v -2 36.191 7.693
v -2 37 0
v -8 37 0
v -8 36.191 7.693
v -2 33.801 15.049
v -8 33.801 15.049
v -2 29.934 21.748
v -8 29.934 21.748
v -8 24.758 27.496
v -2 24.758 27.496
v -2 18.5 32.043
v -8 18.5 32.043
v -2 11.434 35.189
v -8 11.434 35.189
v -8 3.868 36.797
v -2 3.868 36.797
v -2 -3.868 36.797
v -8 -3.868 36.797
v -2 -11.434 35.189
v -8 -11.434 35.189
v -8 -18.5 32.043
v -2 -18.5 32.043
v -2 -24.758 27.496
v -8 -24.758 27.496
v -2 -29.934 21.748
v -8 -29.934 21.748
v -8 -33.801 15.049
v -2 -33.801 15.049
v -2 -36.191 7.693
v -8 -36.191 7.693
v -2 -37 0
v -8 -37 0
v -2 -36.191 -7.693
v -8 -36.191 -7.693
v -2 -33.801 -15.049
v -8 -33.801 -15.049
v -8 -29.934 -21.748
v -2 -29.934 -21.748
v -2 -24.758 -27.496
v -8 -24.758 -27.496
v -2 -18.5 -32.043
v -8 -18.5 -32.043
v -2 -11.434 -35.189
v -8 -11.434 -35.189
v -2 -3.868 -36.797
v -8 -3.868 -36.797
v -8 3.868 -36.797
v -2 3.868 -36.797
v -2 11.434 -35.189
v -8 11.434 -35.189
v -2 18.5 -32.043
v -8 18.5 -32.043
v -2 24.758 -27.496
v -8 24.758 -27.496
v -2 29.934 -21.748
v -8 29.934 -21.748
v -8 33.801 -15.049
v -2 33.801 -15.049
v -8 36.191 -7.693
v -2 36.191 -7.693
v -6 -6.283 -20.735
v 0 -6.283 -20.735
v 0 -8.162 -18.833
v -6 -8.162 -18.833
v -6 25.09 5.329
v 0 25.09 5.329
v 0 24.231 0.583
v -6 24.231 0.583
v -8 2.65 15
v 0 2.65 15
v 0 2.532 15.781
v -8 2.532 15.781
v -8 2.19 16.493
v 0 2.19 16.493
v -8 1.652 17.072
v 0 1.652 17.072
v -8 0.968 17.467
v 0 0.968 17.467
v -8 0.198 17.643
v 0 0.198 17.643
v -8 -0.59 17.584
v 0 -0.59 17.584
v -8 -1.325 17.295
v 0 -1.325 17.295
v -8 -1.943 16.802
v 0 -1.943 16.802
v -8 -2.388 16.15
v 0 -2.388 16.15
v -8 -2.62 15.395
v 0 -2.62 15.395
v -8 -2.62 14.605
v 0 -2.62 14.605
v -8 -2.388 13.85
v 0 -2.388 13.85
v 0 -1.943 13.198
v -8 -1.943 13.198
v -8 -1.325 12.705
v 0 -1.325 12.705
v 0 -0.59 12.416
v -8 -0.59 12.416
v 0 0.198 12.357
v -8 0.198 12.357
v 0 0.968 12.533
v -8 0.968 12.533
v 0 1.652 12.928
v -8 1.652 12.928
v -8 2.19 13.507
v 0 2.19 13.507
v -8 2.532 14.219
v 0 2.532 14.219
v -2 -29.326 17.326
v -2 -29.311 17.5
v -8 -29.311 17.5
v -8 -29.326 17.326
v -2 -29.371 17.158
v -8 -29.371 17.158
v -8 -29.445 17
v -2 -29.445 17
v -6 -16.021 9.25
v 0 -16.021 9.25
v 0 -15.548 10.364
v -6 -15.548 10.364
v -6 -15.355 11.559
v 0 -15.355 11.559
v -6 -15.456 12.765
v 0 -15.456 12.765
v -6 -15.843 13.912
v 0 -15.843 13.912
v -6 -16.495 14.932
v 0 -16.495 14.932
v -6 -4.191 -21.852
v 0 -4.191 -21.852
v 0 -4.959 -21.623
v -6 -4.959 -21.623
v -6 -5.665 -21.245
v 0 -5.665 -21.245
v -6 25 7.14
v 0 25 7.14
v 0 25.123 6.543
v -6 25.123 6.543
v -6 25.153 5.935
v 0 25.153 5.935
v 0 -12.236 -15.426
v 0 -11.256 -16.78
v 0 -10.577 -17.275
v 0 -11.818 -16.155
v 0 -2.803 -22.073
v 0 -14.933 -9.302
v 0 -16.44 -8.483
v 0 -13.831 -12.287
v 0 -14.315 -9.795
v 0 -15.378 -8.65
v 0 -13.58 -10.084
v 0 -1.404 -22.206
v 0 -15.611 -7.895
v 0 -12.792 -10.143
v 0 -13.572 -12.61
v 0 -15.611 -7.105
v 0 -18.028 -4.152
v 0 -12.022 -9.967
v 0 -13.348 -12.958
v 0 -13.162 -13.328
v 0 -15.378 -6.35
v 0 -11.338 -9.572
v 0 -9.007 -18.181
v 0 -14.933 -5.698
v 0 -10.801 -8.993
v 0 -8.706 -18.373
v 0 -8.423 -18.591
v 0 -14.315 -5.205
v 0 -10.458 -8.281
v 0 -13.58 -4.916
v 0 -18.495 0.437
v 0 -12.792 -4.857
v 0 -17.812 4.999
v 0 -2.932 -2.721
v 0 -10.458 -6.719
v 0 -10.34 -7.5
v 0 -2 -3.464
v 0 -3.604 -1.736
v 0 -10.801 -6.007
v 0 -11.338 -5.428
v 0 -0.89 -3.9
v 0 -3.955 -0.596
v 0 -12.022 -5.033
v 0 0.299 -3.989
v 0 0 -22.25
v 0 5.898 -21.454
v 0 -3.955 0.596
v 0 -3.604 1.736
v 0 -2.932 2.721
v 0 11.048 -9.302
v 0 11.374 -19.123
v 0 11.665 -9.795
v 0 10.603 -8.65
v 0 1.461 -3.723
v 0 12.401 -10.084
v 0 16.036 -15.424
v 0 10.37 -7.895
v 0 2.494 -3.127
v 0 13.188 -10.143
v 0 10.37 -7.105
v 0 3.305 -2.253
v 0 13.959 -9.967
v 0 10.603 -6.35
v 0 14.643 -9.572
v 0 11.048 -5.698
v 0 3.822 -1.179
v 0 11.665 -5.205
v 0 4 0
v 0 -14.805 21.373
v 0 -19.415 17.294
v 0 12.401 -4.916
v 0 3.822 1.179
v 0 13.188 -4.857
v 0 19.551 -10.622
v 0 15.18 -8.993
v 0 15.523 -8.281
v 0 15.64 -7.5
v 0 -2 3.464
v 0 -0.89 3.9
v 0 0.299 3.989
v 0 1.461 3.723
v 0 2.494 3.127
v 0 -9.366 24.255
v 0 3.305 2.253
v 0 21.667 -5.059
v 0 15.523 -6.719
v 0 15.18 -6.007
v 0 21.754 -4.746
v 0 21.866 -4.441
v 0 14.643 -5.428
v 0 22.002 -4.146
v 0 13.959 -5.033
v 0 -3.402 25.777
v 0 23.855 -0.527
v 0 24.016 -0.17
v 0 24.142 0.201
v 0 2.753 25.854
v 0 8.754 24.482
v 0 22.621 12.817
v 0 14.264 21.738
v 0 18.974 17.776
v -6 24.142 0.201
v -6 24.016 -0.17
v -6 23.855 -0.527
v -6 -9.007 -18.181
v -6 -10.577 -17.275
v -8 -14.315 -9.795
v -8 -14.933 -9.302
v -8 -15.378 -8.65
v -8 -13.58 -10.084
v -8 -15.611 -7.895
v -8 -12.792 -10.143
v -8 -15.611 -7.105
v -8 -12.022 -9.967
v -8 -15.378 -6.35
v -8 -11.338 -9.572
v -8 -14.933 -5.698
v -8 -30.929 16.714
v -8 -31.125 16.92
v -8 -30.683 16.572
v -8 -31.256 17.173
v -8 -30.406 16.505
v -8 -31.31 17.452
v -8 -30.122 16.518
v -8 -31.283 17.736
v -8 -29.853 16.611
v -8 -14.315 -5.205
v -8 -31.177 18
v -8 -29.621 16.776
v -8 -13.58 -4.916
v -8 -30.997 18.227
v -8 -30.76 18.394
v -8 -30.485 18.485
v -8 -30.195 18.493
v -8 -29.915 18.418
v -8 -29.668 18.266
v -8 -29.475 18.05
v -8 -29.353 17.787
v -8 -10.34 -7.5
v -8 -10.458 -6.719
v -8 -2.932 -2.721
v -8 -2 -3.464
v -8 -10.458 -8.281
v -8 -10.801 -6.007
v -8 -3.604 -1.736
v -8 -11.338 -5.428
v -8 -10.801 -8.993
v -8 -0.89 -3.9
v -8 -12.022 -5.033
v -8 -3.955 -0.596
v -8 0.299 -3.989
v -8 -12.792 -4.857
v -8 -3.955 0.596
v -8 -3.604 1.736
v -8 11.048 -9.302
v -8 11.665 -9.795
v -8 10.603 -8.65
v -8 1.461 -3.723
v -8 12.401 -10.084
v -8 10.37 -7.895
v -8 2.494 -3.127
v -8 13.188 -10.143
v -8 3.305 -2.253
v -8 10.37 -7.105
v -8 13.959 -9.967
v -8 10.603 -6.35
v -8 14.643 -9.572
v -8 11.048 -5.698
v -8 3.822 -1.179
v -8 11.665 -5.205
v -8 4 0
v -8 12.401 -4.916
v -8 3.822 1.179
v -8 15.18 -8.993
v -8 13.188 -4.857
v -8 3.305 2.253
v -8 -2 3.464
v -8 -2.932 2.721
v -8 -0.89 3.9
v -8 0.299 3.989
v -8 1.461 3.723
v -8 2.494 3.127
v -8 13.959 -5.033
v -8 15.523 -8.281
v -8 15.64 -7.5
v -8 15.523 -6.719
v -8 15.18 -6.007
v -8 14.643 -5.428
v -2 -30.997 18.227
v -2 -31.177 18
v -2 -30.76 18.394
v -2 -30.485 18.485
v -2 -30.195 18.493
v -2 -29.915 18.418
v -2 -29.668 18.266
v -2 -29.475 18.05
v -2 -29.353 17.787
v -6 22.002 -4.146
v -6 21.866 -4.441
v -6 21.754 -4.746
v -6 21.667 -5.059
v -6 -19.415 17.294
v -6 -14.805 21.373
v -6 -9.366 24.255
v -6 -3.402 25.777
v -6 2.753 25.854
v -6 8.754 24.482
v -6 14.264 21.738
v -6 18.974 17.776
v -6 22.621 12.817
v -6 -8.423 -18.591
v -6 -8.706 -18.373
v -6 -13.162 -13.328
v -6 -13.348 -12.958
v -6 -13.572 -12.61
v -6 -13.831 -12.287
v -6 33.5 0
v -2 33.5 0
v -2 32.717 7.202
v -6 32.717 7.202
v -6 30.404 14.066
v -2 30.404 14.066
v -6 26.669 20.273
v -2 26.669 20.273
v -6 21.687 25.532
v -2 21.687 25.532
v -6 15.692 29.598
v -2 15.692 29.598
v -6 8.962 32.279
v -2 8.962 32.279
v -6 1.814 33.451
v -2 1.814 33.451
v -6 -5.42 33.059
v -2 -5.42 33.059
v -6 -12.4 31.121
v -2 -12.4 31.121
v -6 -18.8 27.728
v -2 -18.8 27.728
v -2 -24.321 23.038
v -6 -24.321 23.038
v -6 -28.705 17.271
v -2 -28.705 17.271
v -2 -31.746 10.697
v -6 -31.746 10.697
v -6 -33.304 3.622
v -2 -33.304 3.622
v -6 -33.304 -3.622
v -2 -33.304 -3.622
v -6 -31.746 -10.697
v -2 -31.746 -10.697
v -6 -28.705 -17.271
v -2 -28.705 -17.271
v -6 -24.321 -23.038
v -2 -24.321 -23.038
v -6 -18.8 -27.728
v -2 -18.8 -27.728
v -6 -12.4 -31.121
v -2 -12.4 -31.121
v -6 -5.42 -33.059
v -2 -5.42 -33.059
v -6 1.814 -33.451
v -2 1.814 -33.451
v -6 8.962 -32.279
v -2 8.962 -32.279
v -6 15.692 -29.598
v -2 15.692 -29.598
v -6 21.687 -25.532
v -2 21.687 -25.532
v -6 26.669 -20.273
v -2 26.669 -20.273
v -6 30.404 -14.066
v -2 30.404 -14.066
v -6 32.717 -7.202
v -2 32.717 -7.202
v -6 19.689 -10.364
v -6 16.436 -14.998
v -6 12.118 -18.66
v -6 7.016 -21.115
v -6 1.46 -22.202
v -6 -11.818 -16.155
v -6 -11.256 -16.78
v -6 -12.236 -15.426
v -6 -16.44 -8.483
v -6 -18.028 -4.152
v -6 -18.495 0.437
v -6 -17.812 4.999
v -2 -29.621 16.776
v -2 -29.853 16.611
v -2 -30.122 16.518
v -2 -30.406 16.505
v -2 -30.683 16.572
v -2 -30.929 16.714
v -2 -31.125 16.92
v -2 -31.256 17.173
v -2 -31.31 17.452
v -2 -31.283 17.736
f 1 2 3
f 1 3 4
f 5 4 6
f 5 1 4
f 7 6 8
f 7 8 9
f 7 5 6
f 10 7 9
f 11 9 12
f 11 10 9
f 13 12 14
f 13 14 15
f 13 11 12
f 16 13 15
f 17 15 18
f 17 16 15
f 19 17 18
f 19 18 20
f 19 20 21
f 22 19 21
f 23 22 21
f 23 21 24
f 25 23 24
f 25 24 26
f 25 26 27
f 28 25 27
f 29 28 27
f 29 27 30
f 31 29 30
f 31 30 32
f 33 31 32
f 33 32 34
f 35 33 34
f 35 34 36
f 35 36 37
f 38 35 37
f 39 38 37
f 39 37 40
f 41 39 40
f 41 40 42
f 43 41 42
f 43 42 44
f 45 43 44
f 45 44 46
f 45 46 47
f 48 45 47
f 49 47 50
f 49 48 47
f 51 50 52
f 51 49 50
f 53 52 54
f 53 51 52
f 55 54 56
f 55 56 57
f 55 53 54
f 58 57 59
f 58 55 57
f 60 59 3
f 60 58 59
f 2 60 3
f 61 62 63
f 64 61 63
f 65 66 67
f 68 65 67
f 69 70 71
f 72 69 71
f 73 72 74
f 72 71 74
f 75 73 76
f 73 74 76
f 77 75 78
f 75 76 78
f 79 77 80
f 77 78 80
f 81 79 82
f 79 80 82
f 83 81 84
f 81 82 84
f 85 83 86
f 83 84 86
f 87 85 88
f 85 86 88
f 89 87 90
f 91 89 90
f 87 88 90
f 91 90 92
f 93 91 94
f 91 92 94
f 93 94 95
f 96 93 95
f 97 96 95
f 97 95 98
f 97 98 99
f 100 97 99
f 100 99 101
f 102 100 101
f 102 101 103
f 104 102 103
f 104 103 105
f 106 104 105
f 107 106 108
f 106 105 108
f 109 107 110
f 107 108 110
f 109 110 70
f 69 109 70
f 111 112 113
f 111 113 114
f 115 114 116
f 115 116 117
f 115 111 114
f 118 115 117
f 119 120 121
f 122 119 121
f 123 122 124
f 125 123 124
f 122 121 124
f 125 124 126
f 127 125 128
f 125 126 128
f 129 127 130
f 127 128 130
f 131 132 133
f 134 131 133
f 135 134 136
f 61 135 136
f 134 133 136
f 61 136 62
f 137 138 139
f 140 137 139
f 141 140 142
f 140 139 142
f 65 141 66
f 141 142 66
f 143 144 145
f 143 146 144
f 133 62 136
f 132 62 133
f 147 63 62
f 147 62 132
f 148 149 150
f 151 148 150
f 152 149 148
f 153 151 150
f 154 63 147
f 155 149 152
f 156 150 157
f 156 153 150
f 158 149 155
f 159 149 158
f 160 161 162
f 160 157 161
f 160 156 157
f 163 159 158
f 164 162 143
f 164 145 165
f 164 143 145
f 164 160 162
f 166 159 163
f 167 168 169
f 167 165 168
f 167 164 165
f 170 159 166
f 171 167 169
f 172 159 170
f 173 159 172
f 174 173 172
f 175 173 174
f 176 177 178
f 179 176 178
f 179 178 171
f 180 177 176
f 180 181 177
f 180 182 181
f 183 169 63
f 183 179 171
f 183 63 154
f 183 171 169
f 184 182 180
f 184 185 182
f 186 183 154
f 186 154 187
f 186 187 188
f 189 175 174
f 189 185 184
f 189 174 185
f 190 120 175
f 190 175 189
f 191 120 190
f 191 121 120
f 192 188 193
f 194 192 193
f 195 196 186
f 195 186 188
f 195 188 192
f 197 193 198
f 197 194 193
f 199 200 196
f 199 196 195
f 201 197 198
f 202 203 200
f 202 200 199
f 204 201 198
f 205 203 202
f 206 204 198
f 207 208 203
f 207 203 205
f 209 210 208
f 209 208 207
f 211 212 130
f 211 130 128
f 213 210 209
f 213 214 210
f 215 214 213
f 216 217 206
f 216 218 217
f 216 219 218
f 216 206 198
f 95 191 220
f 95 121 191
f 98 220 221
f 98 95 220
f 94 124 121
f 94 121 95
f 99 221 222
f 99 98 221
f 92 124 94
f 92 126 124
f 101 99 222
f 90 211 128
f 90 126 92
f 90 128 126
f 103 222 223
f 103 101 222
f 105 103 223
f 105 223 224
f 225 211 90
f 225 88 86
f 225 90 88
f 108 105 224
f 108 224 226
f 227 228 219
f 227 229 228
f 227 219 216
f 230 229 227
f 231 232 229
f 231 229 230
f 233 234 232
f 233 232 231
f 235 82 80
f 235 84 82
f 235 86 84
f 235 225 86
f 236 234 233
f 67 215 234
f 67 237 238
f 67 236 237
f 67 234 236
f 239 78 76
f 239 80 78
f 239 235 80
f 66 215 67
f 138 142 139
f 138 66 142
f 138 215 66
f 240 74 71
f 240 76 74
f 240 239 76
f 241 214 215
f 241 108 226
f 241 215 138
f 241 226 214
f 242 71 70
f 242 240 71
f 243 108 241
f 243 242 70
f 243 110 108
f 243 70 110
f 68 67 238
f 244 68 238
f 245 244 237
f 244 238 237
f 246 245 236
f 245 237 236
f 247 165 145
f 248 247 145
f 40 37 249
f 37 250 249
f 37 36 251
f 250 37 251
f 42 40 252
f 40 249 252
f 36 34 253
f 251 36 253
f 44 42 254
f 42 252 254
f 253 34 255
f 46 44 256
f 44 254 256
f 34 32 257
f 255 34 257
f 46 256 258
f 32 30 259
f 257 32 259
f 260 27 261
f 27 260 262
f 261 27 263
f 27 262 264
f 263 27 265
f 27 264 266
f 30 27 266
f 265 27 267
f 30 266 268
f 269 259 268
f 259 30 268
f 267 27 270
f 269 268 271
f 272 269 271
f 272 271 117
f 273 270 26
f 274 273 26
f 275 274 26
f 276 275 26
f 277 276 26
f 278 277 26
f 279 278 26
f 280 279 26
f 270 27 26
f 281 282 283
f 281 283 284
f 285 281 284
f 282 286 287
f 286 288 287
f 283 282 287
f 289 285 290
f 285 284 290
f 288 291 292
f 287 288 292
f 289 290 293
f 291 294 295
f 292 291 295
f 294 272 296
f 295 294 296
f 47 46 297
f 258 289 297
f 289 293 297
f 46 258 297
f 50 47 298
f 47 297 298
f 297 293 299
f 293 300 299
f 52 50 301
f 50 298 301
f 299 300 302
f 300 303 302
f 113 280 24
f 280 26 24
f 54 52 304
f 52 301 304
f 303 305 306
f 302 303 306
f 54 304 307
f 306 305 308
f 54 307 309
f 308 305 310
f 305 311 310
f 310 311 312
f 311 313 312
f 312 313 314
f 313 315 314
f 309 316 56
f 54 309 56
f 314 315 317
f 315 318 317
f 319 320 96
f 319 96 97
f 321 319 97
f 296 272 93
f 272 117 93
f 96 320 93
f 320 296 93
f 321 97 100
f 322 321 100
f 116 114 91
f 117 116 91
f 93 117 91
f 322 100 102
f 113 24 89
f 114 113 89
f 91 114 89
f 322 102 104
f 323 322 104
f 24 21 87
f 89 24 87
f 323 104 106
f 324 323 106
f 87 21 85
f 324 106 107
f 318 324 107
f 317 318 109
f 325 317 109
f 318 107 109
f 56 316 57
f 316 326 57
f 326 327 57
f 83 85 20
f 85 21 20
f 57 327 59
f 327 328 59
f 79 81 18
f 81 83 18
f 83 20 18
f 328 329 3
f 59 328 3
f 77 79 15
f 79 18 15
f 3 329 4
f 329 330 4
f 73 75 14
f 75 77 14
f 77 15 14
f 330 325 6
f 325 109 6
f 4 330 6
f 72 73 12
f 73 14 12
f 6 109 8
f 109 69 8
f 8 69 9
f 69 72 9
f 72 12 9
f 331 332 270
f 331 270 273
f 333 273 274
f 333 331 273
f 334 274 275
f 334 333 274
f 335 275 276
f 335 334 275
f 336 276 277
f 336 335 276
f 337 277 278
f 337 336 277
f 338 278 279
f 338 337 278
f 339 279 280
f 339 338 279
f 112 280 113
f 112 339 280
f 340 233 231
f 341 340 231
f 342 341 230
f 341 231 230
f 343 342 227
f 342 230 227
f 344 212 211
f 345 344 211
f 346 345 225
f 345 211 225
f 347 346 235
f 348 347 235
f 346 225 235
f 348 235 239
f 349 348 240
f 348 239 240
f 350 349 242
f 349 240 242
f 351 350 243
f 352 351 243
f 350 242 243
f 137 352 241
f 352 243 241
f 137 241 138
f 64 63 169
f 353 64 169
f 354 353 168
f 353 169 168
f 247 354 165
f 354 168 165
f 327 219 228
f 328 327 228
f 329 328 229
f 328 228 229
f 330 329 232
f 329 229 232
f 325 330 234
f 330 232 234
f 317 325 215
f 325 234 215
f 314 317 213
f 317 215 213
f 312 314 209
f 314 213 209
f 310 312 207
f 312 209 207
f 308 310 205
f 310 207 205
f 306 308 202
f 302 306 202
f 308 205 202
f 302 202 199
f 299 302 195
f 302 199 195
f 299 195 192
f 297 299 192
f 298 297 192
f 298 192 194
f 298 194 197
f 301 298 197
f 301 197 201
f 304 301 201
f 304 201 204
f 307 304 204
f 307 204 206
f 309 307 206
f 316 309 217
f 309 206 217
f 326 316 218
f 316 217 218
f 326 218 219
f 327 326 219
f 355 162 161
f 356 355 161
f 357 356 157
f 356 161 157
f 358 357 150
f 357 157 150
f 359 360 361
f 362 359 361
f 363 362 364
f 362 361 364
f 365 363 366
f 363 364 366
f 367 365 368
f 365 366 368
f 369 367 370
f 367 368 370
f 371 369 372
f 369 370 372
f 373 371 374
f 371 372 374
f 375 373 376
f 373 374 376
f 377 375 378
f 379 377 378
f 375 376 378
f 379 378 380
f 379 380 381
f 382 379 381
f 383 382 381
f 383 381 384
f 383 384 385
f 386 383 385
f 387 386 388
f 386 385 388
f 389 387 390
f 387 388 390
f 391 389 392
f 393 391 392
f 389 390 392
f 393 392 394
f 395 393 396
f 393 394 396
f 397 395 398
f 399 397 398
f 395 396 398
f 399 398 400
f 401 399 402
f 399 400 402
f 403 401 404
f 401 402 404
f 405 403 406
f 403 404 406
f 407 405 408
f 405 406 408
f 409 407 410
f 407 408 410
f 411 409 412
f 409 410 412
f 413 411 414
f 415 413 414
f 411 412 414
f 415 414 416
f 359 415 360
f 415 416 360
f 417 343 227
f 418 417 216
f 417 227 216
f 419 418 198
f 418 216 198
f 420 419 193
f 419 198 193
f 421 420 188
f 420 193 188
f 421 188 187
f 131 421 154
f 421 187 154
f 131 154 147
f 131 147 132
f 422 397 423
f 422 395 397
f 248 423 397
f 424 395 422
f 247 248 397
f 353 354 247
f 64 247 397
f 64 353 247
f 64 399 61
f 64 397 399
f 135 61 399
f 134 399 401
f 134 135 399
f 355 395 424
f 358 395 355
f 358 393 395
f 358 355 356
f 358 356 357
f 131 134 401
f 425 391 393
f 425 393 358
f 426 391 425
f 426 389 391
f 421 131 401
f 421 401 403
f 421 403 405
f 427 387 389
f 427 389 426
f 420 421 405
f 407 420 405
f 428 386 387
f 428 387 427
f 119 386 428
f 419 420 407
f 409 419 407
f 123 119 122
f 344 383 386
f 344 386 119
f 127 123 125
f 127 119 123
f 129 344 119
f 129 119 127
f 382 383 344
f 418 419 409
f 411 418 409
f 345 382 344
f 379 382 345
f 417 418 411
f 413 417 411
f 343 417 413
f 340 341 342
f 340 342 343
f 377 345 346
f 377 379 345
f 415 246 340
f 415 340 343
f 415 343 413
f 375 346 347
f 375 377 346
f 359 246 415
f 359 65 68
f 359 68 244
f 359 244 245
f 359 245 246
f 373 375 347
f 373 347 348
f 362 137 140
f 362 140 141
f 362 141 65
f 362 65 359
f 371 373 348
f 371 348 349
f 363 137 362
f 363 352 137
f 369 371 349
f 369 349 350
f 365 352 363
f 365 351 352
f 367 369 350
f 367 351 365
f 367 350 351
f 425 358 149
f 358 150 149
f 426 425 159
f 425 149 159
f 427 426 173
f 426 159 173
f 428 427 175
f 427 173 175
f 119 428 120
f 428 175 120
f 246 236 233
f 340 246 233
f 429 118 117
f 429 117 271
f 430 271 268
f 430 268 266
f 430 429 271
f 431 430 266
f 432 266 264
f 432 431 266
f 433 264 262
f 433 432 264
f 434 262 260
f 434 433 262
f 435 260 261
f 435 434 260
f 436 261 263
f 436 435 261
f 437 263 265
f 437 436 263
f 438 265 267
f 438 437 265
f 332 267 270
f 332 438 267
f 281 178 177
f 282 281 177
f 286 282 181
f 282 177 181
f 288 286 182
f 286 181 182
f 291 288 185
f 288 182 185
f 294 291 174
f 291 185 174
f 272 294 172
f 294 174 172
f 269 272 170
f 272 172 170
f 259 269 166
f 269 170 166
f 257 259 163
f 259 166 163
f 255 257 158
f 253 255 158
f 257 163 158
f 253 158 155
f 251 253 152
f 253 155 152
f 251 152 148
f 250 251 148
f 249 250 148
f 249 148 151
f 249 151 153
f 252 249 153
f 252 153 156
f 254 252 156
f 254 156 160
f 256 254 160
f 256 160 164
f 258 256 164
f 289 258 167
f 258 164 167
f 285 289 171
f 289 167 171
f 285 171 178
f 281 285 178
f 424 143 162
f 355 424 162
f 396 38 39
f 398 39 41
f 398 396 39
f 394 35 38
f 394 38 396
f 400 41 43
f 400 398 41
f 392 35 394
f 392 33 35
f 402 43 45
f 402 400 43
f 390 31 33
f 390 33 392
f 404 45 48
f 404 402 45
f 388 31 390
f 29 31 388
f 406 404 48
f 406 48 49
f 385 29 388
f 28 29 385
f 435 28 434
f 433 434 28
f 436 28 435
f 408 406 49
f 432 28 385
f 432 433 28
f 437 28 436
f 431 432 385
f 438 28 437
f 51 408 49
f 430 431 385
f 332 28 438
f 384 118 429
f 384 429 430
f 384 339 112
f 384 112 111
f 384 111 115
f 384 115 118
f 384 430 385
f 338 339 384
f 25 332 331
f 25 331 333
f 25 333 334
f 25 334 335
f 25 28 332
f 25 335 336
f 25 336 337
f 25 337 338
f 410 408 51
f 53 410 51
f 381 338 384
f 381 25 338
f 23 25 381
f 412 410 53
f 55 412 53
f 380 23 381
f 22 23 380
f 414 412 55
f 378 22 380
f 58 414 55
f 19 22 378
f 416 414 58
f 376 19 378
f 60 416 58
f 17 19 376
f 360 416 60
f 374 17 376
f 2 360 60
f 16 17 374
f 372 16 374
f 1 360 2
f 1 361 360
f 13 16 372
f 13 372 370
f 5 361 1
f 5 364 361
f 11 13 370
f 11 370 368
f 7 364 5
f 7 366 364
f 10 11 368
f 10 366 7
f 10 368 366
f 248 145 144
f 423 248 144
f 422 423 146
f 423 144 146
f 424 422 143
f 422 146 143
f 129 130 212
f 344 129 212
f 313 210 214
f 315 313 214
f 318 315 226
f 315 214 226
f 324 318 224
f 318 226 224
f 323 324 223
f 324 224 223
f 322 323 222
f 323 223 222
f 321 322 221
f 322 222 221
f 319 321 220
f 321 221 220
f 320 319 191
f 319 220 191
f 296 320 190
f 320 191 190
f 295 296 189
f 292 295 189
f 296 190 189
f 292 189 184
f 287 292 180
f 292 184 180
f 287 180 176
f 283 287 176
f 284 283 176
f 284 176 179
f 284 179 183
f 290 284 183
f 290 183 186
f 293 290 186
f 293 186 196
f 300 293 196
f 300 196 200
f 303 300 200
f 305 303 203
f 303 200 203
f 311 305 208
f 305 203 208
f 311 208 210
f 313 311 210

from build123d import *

# Parameters (mm, degrees)
F0_R     = 37
F0_R_2   = 2.65
F0_R_3   = 4
F1_DEPTH = 8
F2_DEPTH = 2
F3_R     = 33.5
F4_DEPTH = 4


# Not quite as in the source:
# - a feature names something its author has since deleted; it is built from what else it names


with BuildPart() as f1:
    # F0 (on Right) → F1 (new body)
    with BuildSketch(Plane.YZ):
        Circle(F0_R)
        with BuildLine():
            ThreePointArc((-31.1769145362, 18), (-30.0520700874, 18.4659258263), (-29.3108891325, 17.5))
            ThreePointArc((-29.3108891325, 17.5), (-29.3449633062, 17.2411809549), (-29.4448637287, 17))
            ThreePointArc((-29.4448637287, 17), (-30.8108891325, 16.6339745962), (-31.1769145362, 18))
        make_face(mode=Mode.SUBTRACT)
        with BuildLine():
            ThreePointArc((-13.8307570654, -12.2865845131), (-18.4050260219, -1.8721690986), (-16.02146997, 9.25))
            ThreePointArc((-16.02146997, 9.25), (-15.3688742415, 12.1652999186), (-16.4950815942, 14.9323401783))
            Line((-16.4950815942, 14.9323401783), (-19.414607735, 17.2937273743))
            ThreePointArc((-19.414607735, 17.2937273743), (5.7943493018, 25.3461144195), (25.0003908736, 7.1400599553))
            ThreePointArc((25.0003908736, 7.1400599553), (25.1492760253, 6.2395359628), (25.0901387998, 5.3287050027))
            Line((25.0901387998, 5.3287050027), (24.230588756, 0.582974524))
            ThreePointArc((24.230588756, 0.582974524), (24.0836635039, 0.0139846058), (23.8549574473, -0.527337938))
            Line((23.8549574473, -0.527337938), (22.0020362781, -4.1457144451))
            ThreePointArc((22.0020362781, -4.1457144451), (21.8067059734, -4.5923170456), (21.6671490665, -5.0593627397))
            ThreePointArc((21.6671490665, -5.0593627397), (13.8291662627, -17.4303373599), (0, -22.25))
            ThreePointArc((0, -22.25), (-2.1048516517, -22.1502166925), (-4.1908242867, -21.851761755))
            ThreePointArc((-4.1908242867, -21.851761755), (-5.3214186468, -21.4518874672), (-6.2826715748, -20.7348547893))
            Line((-6.2826715748, -20.7348547893), (-8.1615589997, -18.8334098464))
            ThreePointArc((-8.1615589997, -18.8334098464), (-8.5623101549, -18.4787752012), (-9.0068129011, -18.1808078731))
            Line((-9.0068129011, -18.1808078731), (-10.5765097016, -17.2745430028))
            ThreePointArc((-10.5765097016, -17.2745430028), (-11.5533785454, -16.4821921034), (-12.2358922377, -15.4256563749))
            Line((-12.2358922377, -15.4256563749), (-13.1618084894, -13.3279283396))
            ThreePointArc((-13.1618084894, -13.3279283396), (-13.4557617662, -12.781226145), (-13.8307570654, -12.2865845131))
        make_face(mode=Mode.SUBTRACT)
        with BuildLine():
            ThreePointArc((-16.4950815942, 14.9323401783), (-15.3688742415, 12.1652999186), (-16.02146997, 9.25))
            ThreePointArc((-16.02146997, 9.25), (-18.4050260219, -1.8721690986), (-13.8307570654, -12.2865845131))
            ThreePointArc((-13.8307570654, -12.2865845131), (-13.4557617662, -12.781226145), (-13.1618084894, -13.3279283396))
            Line((-13.1618084894, -13.3279283396), (-12.2358922377, -15.4256563749))
            ThreePointArc((-12.2358922377, -15.4256563749), (-11.5533785454, -16.4821921034), (-10.5765097016, -17.2745430028))
            Line((-10.5765097016, -17.2745430028), (-9.0068129011, -18.1808078731))
            ThreePointArc((-9.0068129011, -18.1808078731), (-8.5623101549, -18.4787752012), (-8.1615589997, -18.8334098464))
            Line((-8.1615589997, -18.8334098464), (-6.2826715748, -20.7348547893))
            ThreePointArc((-6.2826715748, -20.7348547893), (-5.3214186468, -21.4518874672), (-4.1908242867, -21.851761755))
            ThreePointArc((-4.1908242867, -21.851761755), (-2.1048516517, -22.1502166925), (0, -22.25))
            ThreePointArc((0, -22.25), (13.8291662627, -17.4303373599), (21.6671490665, -5.0593627397))
            ThreePointArc((21.6671490665, -5.0593627397), (21.8067059734, -4.5923170456), (22.0020362781, -4.1457144451))
            Line((22.0020362781, -4.1457144451), (23.8549574473, -0.527337938))
            ThreePointArc((23.8549574473, -0.527337938), (24.0836635039, 0.0139846058), (24.230588756, 0.582974524))
            Line((24.230588756, 0.582974524), (25.0901387998, 5.3287050027))
            ThreePointArc((25.0901387998, 5.3287050027), (25.1492760253, 6.2395359628), (25.0003908736, 7.1400599553))
            ThreePointArc((25.0003908736, 7.1400599553), (5.7943493018, 25.3461144195), (-19.414607735, 17.2937273743))
            Line((-19.414607735, 17.2937273743), (-16.4950815942, 14.9323401783))
        make_face()
        with Locations((-12.9903810568, -7.5)):
            Circle(F0_R_2, mode=Mode.SUBTRACT)
        with Locations((12.9903810568, -7.5)):
            Circle(F0_R_2, mode=Mode.SUBTRACT)
        Circle(F0_R_3, mode=Mode.SUBTRACT)
        with Locations((0, 15)):
            Circle(F0_R_2, mode=Mode.SUBTRACT)
    extrude(amount=-F1_DEPTH)

    # F0 (on Right) → F2 (cut)
    with BuildSketch(Plane.YZ):
        Circle(F0_R)
        with BuildLine():
            ThreePointArc((-31.1769145362, 18), (-30.0520700874, 18.4659258263), (-29.3108891325, 17.5))
            ThreePointArc((-29.3108891325, 17.5), (-29.3449633062, 17.2411809549), (-29.4448637287, 17))
            ThreePointArc((-29.4448637287, 17), (-30.8108891325, 16.6339745962), (-31.1769145362, 18))
        make_face(mode=Mode.SUBTRACT)
        with BuildLine():
            ThreePointArc((-13.8307570654, -12.2865845131), (-18.4050260219, -1.8721690986), (-16.02146997, 9.25))
            ThreePointArc((-16.02146997, 9.25), (-15.3688742415, 12.1652999186), (-16.4950815942, 14.9323401783))
            Line((-16.4950815942, 14.9323401783), (-19.414607735, 17.2937273743))
            ThreePointArc((-19.414607735, 17.2937273743), (5.7943493018, 25.3461144195), (25.0003908736, 7.1400599553))
            ThreePointArc((25.0003908736, 7.1400599553), (25.1492760253, 6.2395359628), (25.0901387998, 5.3287050027))
            Line((25.0901387998, 5.3287050027), (24.230588756, 0.582974524))
            ThreePointArc((24.230588756, 0.582974524), (24.0836635039, 0.0139846058), (23.8549574473, -0.527337938))
            Line((23.8549574473, -0.527337938), (22.0020362781, -4.1457144451))
            ThreePointArc((22.0020362781, -4.1457144451), (21.8067059734, -4.5923170456), (21.6671490665, -5.0593627397))
            ThreePointArc((21.6671490665, -5.0593627397), (13.8291662627, -17.4303373599), (0, -22.25))
            ThreePointArc((0, -22.25), (-2.1048516517, -22.1502166925), (-4.1908242867, -21.851761755))
            ThreePointArc((-4.1908242867, -21.851761755), (-5.3214186468, -21.4518874672), (-6.2826715748, -20.7348547893))
            Line((-6.2826715748, -20.7348547893), (-8.1615589997, -18.8334098464))
            ThreePointArc((-8.1615589997, -18.8334098464), (-8.5623101549, -18.4787752012), (-9.0068129011, -18.1808078731))
            Line((-9.0068129011, -18.1808078731), (-10.5765097016, -17.2745430028))
            ThreePointArc((-10.5765097016, -17.2745430028), (-11.5533785454, -16.4821921034), (-12.2358922377, -15.4256563749))
            Line((-12.2358922377, -15.4256563749), (-13.1618084894, -13.3279283396))
            ThreePointArc((-13.1618084894, -13.3279283396), (-13.4557617662, -12.781226145), (-13.8307570654, -12.2865845131))
        make_face(mode=Mode.SUBTRACT)
    extrude(amount=-F2_DEPTH, mode=Mode.SUBTRACT)

    # F3 (on face) → F4 (cut)
    with BuildSketch(Plane.YZ.offset(-2)):
        Circle(F3_R)
        with BuildLine():
            ThreePointArc((-13.8307570654, -12.2865845131), (-18.4050260219, -1.8721690986), (-16.02146997, 9.25))
            ThreePointArc((-16.02146997, 9.25), (-15.3688742415, 12.1652999186), (-16.4950815942, 14.9323401783))
            Line((-16.4950815942, 14.9323401783), (-19.414607735, 17.2937273743))
            ThreePointArc((-19.414607735, 17.2937273743), (5.7943493018, 25.3461144195), (25.0003908736, 7.1400599553))
            ThreePointArc((25.0003908736, 7.1400599553), (25.1492760253, 6.2395359628), (25.0901387998, 5.3287050027))
            Line((25.0901387998, 5.3287050027), (24.230588756, 0.582974524))
            ThreePointArc((24.230588756, 0.582974524), (24.0836635039, 0.0139846058), (23.8549574473, -0.527337938))
            Line((23.8549574473, -0.527337938), (22.0020362781, -4.1457144451))
            ThreePointArc((22.0020362781, -4.1457144451), (21.8067059734, -4.5923170456), (21.6671490665, -5.0593627397))
            ThreePointArc((21.6671490665, -5.0593627397), (12.1182361804, -18.6604086739), (-4.1908242867, -21.851761755))
            ThreePointArc((-4.1908242867, -21.851761755), (-5.3214186468, -21.4518874672), (-6.2826715748, -20.7348547893))
            Line((-6.2826715748, -20.7348547893), (-8.1615589997, -18.8334098464))
            ThreePointArc((-8.1615589997, -18.8334098464), (-8.5623101549, -18.4787752012), (-9.0068129011, -18.1808078731))
            Line((-9.0068129011, -18.1808078731), (-10.5765097016, -17.2745430028))
            ThreePointArc((-10.5765097016, -17.2745430028), (-11.5533785454, -16.4821921034), (-12.2358922377, -15.4256563749))
            Line((-12.2358922377, -15.4256563749), (-13.1618084894, -13.3279283396))
            ThreePointArc((-13.1618084894, -13.3279283396), (-13.4557617662, -12.781226145), (-13.8307570654, -12.2865845131))
        make_face(mode=Mode.SUBTRACT)
    extrude(amount=-F4_DEPTH, mode=Mode.SUBTRACT)


solid = f1.part
